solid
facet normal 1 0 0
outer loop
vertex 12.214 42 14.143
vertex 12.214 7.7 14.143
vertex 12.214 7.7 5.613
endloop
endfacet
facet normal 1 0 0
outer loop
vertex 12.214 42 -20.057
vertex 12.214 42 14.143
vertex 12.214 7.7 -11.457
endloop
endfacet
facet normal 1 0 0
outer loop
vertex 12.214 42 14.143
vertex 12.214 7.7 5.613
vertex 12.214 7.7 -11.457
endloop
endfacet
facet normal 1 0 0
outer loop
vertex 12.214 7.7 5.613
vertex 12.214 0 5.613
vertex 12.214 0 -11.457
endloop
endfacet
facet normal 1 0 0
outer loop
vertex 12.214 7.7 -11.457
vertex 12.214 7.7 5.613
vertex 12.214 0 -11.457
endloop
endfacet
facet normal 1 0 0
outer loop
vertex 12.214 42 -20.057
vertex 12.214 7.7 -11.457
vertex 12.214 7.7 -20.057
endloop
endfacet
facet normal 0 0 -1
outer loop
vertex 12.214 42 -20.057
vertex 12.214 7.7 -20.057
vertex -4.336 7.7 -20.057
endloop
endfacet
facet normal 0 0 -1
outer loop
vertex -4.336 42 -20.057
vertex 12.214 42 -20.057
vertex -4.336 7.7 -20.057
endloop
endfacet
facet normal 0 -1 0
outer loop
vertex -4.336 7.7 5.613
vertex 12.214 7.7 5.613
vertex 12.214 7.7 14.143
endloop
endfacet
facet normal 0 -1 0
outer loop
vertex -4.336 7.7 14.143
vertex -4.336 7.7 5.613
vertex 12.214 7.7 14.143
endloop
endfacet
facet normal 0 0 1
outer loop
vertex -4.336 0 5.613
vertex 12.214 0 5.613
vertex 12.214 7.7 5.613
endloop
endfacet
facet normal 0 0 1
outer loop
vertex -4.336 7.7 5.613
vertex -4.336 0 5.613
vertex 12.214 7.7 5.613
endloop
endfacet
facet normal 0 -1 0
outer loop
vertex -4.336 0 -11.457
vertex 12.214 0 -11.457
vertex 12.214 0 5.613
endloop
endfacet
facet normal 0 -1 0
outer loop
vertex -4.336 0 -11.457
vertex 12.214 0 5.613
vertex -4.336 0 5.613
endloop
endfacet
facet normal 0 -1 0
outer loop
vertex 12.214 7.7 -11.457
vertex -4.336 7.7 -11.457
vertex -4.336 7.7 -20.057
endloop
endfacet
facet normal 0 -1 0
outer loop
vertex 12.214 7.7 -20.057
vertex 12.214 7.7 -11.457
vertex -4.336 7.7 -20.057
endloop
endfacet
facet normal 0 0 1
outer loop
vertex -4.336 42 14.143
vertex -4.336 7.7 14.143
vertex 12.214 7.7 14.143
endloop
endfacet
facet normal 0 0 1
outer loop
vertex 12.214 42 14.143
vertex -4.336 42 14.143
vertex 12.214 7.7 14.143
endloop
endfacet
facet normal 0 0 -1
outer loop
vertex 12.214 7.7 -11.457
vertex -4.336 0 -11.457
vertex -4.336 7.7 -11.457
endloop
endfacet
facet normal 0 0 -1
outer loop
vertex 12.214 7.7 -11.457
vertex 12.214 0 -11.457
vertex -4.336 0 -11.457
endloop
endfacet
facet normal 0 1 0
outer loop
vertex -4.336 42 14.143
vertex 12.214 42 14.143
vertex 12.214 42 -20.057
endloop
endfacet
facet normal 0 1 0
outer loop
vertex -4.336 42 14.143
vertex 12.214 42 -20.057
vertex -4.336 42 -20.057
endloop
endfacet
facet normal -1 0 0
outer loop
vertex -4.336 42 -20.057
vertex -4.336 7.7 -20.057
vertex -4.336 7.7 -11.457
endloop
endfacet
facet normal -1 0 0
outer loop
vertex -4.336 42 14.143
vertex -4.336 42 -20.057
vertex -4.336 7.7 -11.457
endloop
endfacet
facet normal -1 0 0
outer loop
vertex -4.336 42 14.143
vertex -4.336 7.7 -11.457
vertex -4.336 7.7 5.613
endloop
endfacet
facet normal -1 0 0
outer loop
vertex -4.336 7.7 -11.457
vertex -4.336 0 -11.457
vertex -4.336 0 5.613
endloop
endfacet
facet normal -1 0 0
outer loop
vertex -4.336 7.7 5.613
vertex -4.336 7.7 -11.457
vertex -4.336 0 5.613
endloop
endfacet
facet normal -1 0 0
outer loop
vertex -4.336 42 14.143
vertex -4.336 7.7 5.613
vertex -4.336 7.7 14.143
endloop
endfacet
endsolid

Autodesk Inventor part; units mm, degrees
ref_plane "YZ Plane" through (0, 0, 0) normal (1, 0, 0) x (0, 1, 0)
ref_plane "XZ Plane" through (0, 0, 0) normal (0, 1, 0) x (-1, 0, 0)
ref_plane "XY Plane" through (0, 0, 0) normal (0, 0, 1) x (1, 0, 0)
sketch "Sketch1" plane through (0, 0, 0) normal (0, 1, 0) x (-1, 0, 0)
  line L0 (4.3357, 14.1429) -> (-12.2143, 14.1429)
  line L1 (-12.2143, 14.1429) -> (-12.2143, -20.0571)
  line L2 (-12.2143, -20.0571) -> (4.3357, -20.0571)
  line L3 (4.3357, -20.0571) -> (4.3357, 14.1429)
  point P0 (0, 0)
  dimension "d0" = 34.2
  dimension "d1" = 16.55
extrude "Extrusion1" add sketch "Sketch1" along normal blind 42
sketch "Sketch2" plane through (12.2143, 0, 14.1429) normal (1, 0, 0) x (0, 0, -1)
  circle A0 centre (17.1, 24.85) radius 1.9655
  line L0 (0, 42) -> (34.2, 42) projected
  line L1 (0, 0) -> (0, 42) projected
  point P0 (14.1429, 0)
  dimension "d4" = 17.15
  dimension "d5" = 17.1
sketch "Sketch3" plane through (12.2143, 0, 14.1429) normal (1, 0, 0) x (0, 0, -1)
  line L0 (0, 0) -> (8.53, 0)
  line L1 (8.53, 0) -> (8.53, 7.7)
  line L2 (8.53, 7.7) -> (0, 7.7)
  line L3 (0, 7.7) -> (0, 0)
  point P0 (14.1429, 0)
  dimension "d18" = 7.7
  dimension "d19" = 8.53
extrude "Extrusion2" cut sketch "Sketch3" against normal blind 17.9375
sketch "Sketch4" plane through (12.2143, 0, -20.0571) normal (1, 0, 0) x (0, 0, -1)
  line L0 (0, 0) -> (0, 42) projected
  line L1 (0, 0) -> (-8.6, 0)
  line L2 (-8.6, 0) -> (-8.6, 7.7)
  line L3 (-8.6, 7.7) -> (0, 7.7)
  line L4 (0, 7.7) -> (0, 0)
  point P0 (-20.0571, 0)
  point P1 (0, 7.7)
  dimension "d22" = 8.6
  dimension "d23" = 7.7
extrude "Extrusion3" cut sketch "Sketch4" against normal blind 17.9375
properties part number "Arducam_Mega"
